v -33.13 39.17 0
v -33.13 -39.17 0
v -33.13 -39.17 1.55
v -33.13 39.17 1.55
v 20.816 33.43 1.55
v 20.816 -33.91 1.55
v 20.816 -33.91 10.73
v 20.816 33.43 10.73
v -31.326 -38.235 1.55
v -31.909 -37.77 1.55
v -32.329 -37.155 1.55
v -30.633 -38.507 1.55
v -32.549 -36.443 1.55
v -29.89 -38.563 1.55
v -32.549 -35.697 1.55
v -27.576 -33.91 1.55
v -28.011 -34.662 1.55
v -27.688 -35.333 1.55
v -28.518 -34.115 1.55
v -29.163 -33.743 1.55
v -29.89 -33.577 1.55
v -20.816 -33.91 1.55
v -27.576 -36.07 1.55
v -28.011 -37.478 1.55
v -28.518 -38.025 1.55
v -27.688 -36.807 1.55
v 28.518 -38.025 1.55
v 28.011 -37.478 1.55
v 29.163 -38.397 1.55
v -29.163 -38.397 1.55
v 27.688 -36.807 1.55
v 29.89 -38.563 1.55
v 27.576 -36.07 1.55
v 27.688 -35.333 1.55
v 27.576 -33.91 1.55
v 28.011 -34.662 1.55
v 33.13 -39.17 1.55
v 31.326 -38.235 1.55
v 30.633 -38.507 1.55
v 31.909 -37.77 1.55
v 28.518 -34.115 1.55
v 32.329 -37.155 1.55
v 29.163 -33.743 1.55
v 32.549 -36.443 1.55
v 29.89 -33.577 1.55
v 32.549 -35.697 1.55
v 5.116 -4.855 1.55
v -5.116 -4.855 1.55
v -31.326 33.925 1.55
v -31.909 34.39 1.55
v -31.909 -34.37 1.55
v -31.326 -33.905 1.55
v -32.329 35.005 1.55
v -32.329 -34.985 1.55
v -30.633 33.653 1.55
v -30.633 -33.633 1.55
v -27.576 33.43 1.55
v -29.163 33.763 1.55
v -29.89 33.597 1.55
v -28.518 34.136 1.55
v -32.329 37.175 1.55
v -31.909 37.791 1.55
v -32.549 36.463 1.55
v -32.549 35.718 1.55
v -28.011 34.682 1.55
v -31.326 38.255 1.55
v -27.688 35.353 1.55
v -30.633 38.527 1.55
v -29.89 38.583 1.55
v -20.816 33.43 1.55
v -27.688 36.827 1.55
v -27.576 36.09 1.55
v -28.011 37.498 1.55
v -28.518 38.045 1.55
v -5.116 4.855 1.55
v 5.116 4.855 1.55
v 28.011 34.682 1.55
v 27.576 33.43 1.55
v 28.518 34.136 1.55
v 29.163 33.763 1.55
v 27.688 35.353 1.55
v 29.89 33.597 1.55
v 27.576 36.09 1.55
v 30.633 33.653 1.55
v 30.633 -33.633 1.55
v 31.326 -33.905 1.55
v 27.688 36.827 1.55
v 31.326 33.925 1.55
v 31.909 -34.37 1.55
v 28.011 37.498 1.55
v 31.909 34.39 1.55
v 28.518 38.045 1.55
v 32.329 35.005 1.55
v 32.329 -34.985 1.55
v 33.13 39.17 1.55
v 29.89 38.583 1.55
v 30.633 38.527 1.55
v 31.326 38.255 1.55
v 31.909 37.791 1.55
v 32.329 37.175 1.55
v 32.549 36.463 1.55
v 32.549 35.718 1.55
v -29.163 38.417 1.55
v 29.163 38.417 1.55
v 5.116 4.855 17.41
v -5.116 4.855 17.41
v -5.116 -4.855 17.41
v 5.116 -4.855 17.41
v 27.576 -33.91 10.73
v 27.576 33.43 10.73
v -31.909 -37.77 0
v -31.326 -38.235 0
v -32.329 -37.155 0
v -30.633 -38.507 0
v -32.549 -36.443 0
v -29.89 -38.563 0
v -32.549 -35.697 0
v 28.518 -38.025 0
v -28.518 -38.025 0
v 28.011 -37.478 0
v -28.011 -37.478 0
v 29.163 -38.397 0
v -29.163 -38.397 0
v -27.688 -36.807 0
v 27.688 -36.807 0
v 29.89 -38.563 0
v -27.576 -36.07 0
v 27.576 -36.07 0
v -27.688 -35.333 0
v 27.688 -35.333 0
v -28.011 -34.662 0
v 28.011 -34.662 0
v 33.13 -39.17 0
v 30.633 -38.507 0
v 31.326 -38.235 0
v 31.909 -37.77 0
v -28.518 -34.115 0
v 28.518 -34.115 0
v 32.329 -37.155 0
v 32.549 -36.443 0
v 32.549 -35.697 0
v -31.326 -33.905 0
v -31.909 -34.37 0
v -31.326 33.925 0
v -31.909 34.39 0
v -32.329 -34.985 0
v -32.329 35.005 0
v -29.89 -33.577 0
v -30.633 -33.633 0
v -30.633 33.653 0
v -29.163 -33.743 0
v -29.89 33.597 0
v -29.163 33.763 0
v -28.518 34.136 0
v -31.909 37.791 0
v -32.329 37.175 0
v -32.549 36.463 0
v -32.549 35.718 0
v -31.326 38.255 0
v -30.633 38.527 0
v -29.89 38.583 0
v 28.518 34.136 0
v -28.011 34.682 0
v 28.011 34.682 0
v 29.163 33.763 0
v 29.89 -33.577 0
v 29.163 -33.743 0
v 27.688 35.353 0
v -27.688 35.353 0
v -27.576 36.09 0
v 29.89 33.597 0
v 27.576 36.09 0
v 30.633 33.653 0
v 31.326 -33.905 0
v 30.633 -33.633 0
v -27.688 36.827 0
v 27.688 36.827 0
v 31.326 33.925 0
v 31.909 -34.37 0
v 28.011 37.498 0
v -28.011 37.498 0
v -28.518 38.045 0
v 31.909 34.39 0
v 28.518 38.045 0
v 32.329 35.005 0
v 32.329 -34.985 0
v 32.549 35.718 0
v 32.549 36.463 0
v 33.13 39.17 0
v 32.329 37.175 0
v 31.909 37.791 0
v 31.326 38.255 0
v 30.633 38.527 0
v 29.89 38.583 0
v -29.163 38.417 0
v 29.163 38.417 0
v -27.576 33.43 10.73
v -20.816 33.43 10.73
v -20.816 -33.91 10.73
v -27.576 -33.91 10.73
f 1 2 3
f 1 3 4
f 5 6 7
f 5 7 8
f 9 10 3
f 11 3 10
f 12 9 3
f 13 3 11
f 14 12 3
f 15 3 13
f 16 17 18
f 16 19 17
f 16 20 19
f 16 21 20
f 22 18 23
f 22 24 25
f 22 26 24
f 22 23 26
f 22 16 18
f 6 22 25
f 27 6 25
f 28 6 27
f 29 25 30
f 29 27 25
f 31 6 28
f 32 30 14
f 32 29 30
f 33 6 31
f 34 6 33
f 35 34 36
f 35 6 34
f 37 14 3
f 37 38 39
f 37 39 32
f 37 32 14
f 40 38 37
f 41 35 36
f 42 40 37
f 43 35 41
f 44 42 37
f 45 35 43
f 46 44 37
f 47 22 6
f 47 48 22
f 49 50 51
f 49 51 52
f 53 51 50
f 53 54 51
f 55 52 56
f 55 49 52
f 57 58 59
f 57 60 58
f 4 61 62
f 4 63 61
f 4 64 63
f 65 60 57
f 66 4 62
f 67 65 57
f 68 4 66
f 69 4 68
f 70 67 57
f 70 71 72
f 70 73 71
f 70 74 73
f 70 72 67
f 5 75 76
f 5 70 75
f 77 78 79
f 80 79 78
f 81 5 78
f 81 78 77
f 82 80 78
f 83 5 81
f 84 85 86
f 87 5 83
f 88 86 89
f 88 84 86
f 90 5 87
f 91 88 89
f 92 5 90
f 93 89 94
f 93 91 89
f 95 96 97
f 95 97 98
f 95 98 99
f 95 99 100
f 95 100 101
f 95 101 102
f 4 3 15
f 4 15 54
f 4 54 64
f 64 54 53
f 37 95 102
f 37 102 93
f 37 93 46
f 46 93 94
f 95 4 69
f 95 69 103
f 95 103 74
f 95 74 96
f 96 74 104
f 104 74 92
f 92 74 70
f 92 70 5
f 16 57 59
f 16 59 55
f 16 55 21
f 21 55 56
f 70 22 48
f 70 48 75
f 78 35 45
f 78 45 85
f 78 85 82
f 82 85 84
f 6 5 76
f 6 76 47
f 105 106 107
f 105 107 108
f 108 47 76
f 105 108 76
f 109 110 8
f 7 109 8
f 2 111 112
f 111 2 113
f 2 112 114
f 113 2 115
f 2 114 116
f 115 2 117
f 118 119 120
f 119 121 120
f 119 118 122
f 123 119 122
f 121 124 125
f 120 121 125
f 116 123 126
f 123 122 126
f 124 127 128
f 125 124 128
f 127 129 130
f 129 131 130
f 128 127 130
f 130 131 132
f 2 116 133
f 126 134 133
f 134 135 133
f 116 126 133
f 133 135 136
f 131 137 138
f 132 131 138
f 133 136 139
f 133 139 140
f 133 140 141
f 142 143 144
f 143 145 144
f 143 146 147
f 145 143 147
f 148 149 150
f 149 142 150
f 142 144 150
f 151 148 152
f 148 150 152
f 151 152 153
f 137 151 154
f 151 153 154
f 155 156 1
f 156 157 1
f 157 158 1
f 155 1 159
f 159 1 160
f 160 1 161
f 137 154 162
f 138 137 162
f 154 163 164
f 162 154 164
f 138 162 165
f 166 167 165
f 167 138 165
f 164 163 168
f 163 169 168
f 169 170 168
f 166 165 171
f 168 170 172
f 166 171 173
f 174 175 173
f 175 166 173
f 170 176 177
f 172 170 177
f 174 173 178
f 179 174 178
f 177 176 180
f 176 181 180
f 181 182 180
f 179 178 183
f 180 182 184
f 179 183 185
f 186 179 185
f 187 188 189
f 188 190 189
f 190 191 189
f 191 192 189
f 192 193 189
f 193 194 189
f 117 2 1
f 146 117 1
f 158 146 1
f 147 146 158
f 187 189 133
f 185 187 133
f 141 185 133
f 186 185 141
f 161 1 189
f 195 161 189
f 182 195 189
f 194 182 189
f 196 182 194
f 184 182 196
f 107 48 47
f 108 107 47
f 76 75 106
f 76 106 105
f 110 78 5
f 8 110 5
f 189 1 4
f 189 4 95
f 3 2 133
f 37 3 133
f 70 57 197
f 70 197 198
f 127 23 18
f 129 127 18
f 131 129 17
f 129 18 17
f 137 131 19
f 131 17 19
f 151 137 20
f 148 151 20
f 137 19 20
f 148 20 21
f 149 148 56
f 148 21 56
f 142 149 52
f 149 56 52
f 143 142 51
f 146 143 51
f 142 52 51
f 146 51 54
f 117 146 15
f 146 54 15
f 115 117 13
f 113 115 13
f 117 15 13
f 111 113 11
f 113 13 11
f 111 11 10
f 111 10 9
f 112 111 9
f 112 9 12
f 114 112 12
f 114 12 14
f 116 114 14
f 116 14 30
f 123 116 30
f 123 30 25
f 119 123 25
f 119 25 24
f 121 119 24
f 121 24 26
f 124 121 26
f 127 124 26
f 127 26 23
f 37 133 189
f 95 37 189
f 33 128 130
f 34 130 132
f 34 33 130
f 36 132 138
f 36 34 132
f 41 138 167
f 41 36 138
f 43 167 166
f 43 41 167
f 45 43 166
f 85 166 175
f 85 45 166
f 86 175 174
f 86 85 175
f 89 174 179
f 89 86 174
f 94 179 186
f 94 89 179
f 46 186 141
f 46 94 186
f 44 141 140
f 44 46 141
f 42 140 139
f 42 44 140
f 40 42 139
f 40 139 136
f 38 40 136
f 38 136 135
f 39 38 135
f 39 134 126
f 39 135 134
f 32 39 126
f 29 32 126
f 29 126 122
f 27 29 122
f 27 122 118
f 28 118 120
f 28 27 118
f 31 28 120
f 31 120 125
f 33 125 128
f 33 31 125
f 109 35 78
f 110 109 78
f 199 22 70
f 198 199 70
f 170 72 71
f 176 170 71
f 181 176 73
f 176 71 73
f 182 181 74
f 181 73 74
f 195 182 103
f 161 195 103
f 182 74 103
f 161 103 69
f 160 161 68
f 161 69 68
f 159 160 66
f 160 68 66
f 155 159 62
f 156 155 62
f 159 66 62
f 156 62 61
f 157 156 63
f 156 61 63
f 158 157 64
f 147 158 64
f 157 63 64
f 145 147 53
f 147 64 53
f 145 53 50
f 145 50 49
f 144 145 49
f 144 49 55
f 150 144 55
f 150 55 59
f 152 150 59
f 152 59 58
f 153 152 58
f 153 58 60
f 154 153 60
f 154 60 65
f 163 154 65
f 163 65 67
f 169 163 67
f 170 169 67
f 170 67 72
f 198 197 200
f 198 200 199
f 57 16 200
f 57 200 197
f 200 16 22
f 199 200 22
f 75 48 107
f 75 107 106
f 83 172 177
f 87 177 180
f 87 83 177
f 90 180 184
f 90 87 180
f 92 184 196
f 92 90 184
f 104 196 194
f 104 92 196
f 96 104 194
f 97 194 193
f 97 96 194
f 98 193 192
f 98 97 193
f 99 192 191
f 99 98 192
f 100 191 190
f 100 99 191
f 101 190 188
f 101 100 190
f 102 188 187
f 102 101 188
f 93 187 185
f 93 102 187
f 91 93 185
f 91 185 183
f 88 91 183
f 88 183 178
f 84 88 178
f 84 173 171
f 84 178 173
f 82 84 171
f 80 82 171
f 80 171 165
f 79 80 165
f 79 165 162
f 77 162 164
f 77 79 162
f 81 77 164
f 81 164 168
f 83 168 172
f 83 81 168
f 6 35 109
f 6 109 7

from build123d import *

# Parameters (mm, degrees)
SKETCH1_W           = 66.26
SKETCH1_H           = 78.34
BOSS_EXTRUDE1_DEPTH = 1.55
SKETCH2_R           = 2.5
CUT_EXTRUDE1_DEPTH  = 16.55
SKETCH3_R           = 2.5
CUT_EXTRUDE2_DEPTH  = 16.55
SKETCH4_W           = 6.76
SKETCH4_H           = 67.34
BOSS_EXTRUDE2_DEPTH = 9.18
SKETCH7_W           = 10.2328791
SKETCH7_H           = 9.710793432
BOSS_EXTRUDE3_DEPTH = 15.86


with BuildPart() as part:
    # Sketch1 → Boss-Extrude1 (new body)
    with BuildSketch(Plane.XY):
        Rectangle(SKETCH1_W, SKETCH1_H)
    extrude(amount=BOSS_EXTRUDE1_DEPTH)

    # Sketch2 → Cut-Extrude1 (cut)
    with BuildSketch(Plane.XY.offset(1.55)):
        with Locations((-30.076432851, 36.090160922)):
            Circle(SKETCH2_R)
    cut_extrude1 = extrude(amount=-CUT_EXTRUDE1_DEPTH, mode=Mode.SUBTRACT)

    # Sketch3 → Cut-Extrude2 (cut)
    with BuildSketch(Plane.XY.offset(1.55)):
        with Locations((-30.076432851, -36.07)):
            Circle(SKETCH3_R)
    cut_extrude2 = extrude(amount=-CUT_EXTRUDE2_DEPTH, mode=Mode.SUBTRACT)

    # Mirror1: Cut-Extrude1, Cut-Extrude2 across plane
    add(cut_extrude1.mirror(Plane(origin=(0, 0, 0), x_dir=(0, 0, 1), z_dir=(1, 0, 0))), mode=Mode.SUBTRACT)
    add(cut_extrude2.mirror(Plane(origin=(0, 0, 0), x_dir=(0, 0, 1), z_dir=(1, 0, 0))), mode=Mode.SUBTRACT)

    # Sketch4 → Boss-Extrude2 (add)
    with BuildSketch(Plane.XY.offset(1.55)):
        with Locations((-24.196432851, -0.24)):
            Rectangle(SKETCH4_W, SKETCH4_H)
    boss_extrude2 = extrude(amount=BOSS_EXTRUDE2_DEPTH)

    # Mirror2: Boss-Extrude2 across plane
    add(boss_extrude2.mirror(Plane(origin=(0, 0, 0), x_dir=(0, 0, 1), z_dir=(1, 0, 0))))

    # Sketch7 → Boss-Extrude3 (add)
    with BuildSketch(Plane.XY.offset(1.55)):
        Rectangle(SKETCH7_W, SKETCH7_H)
    extrude(amount=BOSS_EXTRUDE3_DEPTH)


solid = part.part
